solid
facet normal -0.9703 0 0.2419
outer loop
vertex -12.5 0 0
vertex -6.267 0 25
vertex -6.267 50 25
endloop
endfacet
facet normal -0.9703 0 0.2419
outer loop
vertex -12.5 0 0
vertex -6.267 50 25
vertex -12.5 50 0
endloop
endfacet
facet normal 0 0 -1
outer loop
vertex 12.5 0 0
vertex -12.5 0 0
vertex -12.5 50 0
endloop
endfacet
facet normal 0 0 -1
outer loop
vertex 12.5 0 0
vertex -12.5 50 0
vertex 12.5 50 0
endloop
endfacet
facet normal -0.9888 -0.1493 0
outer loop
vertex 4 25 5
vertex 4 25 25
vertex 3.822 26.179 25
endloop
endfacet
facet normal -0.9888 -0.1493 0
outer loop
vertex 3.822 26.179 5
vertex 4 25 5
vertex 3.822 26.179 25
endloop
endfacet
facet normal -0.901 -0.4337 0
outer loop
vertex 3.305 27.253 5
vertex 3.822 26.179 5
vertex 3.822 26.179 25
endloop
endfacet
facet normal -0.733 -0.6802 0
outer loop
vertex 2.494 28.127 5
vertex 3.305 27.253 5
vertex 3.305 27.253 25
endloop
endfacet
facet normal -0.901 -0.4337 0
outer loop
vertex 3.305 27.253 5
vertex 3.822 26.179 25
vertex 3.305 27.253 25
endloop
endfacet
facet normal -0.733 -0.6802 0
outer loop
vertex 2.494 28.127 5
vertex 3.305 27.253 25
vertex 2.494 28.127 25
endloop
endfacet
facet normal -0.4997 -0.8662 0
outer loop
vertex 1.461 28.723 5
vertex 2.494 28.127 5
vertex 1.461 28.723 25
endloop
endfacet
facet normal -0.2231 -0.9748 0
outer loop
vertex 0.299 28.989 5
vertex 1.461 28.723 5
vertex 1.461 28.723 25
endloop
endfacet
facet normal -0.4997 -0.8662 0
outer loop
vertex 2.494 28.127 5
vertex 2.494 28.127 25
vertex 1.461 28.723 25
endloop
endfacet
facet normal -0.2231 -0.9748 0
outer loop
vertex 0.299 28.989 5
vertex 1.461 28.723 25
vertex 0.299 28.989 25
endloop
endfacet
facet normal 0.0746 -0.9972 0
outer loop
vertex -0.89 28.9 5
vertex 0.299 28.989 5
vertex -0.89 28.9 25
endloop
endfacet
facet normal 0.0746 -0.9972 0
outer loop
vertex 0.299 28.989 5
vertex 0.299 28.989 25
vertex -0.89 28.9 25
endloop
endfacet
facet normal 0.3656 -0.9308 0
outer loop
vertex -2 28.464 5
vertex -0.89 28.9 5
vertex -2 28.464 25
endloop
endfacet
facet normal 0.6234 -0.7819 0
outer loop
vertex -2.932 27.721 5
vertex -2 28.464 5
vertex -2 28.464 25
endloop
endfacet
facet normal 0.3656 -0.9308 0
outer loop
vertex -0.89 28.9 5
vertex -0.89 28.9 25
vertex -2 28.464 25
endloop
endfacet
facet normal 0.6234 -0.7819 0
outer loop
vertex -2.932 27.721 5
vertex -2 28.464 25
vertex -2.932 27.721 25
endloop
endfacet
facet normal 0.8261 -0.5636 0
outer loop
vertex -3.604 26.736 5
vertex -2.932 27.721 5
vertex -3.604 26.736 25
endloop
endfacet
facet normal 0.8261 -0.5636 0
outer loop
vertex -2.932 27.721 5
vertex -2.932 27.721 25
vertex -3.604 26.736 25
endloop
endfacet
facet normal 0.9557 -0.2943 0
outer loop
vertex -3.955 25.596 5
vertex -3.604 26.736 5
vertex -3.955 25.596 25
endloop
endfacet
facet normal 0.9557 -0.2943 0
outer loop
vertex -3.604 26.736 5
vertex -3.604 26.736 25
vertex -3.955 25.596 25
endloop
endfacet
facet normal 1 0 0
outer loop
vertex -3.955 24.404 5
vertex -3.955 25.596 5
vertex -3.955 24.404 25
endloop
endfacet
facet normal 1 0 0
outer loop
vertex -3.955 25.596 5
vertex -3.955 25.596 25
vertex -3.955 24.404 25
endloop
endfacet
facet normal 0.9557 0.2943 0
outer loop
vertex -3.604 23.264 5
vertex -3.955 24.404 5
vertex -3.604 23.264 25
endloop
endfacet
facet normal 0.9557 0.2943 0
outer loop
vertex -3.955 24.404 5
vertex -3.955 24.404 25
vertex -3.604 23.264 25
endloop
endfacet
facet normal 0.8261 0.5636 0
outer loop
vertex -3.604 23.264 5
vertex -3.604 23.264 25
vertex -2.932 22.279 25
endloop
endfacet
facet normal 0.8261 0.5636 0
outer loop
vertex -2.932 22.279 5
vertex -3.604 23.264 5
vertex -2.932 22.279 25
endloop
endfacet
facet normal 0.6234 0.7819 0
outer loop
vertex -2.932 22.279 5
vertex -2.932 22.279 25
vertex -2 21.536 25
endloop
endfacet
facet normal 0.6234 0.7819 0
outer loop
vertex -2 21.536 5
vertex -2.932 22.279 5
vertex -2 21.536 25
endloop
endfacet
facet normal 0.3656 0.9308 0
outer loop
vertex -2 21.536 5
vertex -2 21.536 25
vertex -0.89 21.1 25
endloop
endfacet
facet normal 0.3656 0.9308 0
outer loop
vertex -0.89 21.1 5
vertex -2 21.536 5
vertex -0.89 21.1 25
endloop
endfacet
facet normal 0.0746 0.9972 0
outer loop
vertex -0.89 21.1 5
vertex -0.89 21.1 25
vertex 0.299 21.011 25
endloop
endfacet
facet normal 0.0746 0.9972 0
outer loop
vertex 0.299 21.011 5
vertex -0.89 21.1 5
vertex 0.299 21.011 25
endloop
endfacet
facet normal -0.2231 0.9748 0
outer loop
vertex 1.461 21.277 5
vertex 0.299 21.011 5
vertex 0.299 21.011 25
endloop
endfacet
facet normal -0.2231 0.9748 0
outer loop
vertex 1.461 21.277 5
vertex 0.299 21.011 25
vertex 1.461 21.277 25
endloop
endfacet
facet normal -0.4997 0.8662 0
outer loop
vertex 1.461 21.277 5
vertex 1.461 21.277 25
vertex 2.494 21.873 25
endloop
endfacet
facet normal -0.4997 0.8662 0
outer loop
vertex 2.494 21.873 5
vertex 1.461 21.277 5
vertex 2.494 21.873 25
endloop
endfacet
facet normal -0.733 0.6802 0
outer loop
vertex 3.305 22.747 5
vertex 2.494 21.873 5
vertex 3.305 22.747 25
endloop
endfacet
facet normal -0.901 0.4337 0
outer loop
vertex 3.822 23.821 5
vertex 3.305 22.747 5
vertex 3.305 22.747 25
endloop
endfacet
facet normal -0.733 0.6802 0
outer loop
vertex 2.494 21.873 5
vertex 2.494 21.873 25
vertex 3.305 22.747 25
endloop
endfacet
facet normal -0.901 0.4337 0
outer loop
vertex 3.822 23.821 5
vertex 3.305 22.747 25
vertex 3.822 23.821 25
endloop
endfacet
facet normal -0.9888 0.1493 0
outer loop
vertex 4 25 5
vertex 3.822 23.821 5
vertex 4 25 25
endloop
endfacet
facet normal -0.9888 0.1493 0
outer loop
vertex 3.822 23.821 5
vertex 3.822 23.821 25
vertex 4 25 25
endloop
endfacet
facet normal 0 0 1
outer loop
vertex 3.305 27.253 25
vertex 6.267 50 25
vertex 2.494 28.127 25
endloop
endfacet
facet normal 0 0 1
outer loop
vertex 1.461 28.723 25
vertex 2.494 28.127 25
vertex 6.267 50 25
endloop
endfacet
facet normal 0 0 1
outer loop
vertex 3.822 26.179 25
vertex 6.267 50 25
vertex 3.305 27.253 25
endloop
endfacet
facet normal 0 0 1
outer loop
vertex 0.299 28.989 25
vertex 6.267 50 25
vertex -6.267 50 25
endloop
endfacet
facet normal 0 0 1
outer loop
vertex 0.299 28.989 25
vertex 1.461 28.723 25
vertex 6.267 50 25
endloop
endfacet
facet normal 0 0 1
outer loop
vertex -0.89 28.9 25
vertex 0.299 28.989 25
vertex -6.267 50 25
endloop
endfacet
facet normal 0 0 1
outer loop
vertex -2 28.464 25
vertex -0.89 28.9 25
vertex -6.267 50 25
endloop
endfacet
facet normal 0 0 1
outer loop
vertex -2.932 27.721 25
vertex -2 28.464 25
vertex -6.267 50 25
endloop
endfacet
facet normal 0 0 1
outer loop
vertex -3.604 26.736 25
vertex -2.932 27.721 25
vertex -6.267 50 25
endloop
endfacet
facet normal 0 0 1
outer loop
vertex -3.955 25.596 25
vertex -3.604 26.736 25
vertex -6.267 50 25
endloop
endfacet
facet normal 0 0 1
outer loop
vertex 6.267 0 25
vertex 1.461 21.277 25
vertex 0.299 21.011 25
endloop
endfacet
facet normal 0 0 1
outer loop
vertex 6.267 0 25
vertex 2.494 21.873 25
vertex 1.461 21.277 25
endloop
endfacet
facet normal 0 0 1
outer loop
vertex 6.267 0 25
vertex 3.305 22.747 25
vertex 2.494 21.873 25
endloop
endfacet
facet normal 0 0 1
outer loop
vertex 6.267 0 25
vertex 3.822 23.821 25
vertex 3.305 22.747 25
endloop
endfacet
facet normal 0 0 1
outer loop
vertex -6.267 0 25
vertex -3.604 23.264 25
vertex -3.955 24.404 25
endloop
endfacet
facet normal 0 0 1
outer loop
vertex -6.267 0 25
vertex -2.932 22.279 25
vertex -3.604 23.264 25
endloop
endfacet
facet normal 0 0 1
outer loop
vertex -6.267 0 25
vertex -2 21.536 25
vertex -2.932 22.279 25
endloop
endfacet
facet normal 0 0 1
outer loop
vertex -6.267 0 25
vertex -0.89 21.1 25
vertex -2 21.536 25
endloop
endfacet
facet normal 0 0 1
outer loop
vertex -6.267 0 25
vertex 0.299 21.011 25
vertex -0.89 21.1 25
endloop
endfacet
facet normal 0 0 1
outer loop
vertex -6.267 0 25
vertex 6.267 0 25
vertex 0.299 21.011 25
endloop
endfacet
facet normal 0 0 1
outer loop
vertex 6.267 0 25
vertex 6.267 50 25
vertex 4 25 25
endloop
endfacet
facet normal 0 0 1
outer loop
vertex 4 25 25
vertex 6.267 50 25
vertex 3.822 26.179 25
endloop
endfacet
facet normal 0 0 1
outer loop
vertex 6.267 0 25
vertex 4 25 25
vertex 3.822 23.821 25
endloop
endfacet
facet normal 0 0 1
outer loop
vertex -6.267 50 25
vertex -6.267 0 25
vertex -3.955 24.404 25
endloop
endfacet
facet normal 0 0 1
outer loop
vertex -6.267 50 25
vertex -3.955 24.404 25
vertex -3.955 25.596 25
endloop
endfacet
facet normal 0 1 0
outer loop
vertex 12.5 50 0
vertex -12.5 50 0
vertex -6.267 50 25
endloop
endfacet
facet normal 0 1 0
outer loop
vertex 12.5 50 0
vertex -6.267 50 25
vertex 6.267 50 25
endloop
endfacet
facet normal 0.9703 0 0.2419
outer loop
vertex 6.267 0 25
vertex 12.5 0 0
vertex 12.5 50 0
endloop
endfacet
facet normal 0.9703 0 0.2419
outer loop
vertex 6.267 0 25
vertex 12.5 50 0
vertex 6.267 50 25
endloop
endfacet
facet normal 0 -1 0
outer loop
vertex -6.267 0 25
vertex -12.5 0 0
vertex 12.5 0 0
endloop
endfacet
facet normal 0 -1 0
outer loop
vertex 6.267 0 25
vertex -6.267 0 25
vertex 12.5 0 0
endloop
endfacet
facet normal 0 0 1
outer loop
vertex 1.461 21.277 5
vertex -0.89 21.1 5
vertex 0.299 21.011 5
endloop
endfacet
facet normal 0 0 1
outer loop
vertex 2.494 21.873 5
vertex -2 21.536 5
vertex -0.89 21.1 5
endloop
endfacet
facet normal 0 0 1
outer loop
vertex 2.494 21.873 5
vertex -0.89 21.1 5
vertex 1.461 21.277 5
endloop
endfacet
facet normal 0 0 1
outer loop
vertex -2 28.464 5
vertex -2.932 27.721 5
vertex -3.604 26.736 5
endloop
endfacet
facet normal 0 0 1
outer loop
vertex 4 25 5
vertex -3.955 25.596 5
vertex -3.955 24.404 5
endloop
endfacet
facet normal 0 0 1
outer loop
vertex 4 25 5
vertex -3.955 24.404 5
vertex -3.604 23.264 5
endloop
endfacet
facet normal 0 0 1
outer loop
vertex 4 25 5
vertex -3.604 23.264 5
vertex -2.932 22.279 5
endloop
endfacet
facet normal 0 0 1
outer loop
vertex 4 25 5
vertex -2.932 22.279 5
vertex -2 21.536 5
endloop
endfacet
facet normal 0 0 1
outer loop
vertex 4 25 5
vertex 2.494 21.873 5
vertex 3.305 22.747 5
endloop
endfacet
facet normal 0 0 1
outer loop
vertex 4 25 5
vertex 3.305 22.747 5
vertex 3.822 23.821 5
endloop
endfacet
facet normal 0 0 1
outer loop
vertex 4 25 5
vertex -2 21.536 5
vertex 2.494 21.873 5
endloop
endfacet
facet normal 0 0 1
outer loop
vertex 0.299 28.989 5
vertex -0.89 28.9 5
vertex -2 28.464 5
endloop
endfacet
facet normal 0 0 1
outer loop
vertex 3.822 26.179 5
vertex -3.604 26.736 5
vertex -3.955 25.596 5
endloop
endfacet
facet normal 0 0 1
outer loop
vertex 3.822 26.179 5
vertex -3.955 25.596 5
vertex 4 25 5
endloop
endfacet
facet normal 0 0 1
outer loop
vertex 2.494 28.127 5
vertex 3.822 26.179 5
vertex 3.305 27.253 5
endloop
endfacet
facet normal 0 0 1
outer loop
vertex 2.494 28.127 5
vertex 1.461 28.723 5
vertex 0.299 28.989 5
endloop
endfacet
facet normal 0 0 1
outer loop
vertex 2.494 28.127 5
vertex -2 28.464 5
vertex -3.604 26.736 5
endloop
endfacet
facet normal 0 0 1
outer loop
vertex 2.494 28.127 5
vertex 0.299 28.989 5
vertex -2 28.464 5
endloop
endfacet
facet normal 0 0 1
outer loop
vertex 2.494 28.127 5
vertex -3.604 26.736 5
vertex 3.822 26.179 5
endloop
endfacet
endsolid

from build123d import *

# Parameters (mm, degrees)
F1_DEPTH = 50
F2_R     = 4
F3_DEPTH = 20


with BuildPart() as f1:
    # F0 (on Front) → F1 (new body)
    with BuildSketch(Plane.XZ):
        Polygon((-6.2668, 25), (-12.5, 0), (12.5, 0), (6.2668, 25), align=None)
    extrude(amount=-F1_DEPTH)

    # F2 (on face) → F3 (cut)
    with BuildSketch(Plane.XY.offset(25)):
        with Locations((0, 25)):
            Circle(F2_R)
    extrude(amount=-F3_DEPTH, mode=Mode.SUBTRACT)


solid = f1.part
